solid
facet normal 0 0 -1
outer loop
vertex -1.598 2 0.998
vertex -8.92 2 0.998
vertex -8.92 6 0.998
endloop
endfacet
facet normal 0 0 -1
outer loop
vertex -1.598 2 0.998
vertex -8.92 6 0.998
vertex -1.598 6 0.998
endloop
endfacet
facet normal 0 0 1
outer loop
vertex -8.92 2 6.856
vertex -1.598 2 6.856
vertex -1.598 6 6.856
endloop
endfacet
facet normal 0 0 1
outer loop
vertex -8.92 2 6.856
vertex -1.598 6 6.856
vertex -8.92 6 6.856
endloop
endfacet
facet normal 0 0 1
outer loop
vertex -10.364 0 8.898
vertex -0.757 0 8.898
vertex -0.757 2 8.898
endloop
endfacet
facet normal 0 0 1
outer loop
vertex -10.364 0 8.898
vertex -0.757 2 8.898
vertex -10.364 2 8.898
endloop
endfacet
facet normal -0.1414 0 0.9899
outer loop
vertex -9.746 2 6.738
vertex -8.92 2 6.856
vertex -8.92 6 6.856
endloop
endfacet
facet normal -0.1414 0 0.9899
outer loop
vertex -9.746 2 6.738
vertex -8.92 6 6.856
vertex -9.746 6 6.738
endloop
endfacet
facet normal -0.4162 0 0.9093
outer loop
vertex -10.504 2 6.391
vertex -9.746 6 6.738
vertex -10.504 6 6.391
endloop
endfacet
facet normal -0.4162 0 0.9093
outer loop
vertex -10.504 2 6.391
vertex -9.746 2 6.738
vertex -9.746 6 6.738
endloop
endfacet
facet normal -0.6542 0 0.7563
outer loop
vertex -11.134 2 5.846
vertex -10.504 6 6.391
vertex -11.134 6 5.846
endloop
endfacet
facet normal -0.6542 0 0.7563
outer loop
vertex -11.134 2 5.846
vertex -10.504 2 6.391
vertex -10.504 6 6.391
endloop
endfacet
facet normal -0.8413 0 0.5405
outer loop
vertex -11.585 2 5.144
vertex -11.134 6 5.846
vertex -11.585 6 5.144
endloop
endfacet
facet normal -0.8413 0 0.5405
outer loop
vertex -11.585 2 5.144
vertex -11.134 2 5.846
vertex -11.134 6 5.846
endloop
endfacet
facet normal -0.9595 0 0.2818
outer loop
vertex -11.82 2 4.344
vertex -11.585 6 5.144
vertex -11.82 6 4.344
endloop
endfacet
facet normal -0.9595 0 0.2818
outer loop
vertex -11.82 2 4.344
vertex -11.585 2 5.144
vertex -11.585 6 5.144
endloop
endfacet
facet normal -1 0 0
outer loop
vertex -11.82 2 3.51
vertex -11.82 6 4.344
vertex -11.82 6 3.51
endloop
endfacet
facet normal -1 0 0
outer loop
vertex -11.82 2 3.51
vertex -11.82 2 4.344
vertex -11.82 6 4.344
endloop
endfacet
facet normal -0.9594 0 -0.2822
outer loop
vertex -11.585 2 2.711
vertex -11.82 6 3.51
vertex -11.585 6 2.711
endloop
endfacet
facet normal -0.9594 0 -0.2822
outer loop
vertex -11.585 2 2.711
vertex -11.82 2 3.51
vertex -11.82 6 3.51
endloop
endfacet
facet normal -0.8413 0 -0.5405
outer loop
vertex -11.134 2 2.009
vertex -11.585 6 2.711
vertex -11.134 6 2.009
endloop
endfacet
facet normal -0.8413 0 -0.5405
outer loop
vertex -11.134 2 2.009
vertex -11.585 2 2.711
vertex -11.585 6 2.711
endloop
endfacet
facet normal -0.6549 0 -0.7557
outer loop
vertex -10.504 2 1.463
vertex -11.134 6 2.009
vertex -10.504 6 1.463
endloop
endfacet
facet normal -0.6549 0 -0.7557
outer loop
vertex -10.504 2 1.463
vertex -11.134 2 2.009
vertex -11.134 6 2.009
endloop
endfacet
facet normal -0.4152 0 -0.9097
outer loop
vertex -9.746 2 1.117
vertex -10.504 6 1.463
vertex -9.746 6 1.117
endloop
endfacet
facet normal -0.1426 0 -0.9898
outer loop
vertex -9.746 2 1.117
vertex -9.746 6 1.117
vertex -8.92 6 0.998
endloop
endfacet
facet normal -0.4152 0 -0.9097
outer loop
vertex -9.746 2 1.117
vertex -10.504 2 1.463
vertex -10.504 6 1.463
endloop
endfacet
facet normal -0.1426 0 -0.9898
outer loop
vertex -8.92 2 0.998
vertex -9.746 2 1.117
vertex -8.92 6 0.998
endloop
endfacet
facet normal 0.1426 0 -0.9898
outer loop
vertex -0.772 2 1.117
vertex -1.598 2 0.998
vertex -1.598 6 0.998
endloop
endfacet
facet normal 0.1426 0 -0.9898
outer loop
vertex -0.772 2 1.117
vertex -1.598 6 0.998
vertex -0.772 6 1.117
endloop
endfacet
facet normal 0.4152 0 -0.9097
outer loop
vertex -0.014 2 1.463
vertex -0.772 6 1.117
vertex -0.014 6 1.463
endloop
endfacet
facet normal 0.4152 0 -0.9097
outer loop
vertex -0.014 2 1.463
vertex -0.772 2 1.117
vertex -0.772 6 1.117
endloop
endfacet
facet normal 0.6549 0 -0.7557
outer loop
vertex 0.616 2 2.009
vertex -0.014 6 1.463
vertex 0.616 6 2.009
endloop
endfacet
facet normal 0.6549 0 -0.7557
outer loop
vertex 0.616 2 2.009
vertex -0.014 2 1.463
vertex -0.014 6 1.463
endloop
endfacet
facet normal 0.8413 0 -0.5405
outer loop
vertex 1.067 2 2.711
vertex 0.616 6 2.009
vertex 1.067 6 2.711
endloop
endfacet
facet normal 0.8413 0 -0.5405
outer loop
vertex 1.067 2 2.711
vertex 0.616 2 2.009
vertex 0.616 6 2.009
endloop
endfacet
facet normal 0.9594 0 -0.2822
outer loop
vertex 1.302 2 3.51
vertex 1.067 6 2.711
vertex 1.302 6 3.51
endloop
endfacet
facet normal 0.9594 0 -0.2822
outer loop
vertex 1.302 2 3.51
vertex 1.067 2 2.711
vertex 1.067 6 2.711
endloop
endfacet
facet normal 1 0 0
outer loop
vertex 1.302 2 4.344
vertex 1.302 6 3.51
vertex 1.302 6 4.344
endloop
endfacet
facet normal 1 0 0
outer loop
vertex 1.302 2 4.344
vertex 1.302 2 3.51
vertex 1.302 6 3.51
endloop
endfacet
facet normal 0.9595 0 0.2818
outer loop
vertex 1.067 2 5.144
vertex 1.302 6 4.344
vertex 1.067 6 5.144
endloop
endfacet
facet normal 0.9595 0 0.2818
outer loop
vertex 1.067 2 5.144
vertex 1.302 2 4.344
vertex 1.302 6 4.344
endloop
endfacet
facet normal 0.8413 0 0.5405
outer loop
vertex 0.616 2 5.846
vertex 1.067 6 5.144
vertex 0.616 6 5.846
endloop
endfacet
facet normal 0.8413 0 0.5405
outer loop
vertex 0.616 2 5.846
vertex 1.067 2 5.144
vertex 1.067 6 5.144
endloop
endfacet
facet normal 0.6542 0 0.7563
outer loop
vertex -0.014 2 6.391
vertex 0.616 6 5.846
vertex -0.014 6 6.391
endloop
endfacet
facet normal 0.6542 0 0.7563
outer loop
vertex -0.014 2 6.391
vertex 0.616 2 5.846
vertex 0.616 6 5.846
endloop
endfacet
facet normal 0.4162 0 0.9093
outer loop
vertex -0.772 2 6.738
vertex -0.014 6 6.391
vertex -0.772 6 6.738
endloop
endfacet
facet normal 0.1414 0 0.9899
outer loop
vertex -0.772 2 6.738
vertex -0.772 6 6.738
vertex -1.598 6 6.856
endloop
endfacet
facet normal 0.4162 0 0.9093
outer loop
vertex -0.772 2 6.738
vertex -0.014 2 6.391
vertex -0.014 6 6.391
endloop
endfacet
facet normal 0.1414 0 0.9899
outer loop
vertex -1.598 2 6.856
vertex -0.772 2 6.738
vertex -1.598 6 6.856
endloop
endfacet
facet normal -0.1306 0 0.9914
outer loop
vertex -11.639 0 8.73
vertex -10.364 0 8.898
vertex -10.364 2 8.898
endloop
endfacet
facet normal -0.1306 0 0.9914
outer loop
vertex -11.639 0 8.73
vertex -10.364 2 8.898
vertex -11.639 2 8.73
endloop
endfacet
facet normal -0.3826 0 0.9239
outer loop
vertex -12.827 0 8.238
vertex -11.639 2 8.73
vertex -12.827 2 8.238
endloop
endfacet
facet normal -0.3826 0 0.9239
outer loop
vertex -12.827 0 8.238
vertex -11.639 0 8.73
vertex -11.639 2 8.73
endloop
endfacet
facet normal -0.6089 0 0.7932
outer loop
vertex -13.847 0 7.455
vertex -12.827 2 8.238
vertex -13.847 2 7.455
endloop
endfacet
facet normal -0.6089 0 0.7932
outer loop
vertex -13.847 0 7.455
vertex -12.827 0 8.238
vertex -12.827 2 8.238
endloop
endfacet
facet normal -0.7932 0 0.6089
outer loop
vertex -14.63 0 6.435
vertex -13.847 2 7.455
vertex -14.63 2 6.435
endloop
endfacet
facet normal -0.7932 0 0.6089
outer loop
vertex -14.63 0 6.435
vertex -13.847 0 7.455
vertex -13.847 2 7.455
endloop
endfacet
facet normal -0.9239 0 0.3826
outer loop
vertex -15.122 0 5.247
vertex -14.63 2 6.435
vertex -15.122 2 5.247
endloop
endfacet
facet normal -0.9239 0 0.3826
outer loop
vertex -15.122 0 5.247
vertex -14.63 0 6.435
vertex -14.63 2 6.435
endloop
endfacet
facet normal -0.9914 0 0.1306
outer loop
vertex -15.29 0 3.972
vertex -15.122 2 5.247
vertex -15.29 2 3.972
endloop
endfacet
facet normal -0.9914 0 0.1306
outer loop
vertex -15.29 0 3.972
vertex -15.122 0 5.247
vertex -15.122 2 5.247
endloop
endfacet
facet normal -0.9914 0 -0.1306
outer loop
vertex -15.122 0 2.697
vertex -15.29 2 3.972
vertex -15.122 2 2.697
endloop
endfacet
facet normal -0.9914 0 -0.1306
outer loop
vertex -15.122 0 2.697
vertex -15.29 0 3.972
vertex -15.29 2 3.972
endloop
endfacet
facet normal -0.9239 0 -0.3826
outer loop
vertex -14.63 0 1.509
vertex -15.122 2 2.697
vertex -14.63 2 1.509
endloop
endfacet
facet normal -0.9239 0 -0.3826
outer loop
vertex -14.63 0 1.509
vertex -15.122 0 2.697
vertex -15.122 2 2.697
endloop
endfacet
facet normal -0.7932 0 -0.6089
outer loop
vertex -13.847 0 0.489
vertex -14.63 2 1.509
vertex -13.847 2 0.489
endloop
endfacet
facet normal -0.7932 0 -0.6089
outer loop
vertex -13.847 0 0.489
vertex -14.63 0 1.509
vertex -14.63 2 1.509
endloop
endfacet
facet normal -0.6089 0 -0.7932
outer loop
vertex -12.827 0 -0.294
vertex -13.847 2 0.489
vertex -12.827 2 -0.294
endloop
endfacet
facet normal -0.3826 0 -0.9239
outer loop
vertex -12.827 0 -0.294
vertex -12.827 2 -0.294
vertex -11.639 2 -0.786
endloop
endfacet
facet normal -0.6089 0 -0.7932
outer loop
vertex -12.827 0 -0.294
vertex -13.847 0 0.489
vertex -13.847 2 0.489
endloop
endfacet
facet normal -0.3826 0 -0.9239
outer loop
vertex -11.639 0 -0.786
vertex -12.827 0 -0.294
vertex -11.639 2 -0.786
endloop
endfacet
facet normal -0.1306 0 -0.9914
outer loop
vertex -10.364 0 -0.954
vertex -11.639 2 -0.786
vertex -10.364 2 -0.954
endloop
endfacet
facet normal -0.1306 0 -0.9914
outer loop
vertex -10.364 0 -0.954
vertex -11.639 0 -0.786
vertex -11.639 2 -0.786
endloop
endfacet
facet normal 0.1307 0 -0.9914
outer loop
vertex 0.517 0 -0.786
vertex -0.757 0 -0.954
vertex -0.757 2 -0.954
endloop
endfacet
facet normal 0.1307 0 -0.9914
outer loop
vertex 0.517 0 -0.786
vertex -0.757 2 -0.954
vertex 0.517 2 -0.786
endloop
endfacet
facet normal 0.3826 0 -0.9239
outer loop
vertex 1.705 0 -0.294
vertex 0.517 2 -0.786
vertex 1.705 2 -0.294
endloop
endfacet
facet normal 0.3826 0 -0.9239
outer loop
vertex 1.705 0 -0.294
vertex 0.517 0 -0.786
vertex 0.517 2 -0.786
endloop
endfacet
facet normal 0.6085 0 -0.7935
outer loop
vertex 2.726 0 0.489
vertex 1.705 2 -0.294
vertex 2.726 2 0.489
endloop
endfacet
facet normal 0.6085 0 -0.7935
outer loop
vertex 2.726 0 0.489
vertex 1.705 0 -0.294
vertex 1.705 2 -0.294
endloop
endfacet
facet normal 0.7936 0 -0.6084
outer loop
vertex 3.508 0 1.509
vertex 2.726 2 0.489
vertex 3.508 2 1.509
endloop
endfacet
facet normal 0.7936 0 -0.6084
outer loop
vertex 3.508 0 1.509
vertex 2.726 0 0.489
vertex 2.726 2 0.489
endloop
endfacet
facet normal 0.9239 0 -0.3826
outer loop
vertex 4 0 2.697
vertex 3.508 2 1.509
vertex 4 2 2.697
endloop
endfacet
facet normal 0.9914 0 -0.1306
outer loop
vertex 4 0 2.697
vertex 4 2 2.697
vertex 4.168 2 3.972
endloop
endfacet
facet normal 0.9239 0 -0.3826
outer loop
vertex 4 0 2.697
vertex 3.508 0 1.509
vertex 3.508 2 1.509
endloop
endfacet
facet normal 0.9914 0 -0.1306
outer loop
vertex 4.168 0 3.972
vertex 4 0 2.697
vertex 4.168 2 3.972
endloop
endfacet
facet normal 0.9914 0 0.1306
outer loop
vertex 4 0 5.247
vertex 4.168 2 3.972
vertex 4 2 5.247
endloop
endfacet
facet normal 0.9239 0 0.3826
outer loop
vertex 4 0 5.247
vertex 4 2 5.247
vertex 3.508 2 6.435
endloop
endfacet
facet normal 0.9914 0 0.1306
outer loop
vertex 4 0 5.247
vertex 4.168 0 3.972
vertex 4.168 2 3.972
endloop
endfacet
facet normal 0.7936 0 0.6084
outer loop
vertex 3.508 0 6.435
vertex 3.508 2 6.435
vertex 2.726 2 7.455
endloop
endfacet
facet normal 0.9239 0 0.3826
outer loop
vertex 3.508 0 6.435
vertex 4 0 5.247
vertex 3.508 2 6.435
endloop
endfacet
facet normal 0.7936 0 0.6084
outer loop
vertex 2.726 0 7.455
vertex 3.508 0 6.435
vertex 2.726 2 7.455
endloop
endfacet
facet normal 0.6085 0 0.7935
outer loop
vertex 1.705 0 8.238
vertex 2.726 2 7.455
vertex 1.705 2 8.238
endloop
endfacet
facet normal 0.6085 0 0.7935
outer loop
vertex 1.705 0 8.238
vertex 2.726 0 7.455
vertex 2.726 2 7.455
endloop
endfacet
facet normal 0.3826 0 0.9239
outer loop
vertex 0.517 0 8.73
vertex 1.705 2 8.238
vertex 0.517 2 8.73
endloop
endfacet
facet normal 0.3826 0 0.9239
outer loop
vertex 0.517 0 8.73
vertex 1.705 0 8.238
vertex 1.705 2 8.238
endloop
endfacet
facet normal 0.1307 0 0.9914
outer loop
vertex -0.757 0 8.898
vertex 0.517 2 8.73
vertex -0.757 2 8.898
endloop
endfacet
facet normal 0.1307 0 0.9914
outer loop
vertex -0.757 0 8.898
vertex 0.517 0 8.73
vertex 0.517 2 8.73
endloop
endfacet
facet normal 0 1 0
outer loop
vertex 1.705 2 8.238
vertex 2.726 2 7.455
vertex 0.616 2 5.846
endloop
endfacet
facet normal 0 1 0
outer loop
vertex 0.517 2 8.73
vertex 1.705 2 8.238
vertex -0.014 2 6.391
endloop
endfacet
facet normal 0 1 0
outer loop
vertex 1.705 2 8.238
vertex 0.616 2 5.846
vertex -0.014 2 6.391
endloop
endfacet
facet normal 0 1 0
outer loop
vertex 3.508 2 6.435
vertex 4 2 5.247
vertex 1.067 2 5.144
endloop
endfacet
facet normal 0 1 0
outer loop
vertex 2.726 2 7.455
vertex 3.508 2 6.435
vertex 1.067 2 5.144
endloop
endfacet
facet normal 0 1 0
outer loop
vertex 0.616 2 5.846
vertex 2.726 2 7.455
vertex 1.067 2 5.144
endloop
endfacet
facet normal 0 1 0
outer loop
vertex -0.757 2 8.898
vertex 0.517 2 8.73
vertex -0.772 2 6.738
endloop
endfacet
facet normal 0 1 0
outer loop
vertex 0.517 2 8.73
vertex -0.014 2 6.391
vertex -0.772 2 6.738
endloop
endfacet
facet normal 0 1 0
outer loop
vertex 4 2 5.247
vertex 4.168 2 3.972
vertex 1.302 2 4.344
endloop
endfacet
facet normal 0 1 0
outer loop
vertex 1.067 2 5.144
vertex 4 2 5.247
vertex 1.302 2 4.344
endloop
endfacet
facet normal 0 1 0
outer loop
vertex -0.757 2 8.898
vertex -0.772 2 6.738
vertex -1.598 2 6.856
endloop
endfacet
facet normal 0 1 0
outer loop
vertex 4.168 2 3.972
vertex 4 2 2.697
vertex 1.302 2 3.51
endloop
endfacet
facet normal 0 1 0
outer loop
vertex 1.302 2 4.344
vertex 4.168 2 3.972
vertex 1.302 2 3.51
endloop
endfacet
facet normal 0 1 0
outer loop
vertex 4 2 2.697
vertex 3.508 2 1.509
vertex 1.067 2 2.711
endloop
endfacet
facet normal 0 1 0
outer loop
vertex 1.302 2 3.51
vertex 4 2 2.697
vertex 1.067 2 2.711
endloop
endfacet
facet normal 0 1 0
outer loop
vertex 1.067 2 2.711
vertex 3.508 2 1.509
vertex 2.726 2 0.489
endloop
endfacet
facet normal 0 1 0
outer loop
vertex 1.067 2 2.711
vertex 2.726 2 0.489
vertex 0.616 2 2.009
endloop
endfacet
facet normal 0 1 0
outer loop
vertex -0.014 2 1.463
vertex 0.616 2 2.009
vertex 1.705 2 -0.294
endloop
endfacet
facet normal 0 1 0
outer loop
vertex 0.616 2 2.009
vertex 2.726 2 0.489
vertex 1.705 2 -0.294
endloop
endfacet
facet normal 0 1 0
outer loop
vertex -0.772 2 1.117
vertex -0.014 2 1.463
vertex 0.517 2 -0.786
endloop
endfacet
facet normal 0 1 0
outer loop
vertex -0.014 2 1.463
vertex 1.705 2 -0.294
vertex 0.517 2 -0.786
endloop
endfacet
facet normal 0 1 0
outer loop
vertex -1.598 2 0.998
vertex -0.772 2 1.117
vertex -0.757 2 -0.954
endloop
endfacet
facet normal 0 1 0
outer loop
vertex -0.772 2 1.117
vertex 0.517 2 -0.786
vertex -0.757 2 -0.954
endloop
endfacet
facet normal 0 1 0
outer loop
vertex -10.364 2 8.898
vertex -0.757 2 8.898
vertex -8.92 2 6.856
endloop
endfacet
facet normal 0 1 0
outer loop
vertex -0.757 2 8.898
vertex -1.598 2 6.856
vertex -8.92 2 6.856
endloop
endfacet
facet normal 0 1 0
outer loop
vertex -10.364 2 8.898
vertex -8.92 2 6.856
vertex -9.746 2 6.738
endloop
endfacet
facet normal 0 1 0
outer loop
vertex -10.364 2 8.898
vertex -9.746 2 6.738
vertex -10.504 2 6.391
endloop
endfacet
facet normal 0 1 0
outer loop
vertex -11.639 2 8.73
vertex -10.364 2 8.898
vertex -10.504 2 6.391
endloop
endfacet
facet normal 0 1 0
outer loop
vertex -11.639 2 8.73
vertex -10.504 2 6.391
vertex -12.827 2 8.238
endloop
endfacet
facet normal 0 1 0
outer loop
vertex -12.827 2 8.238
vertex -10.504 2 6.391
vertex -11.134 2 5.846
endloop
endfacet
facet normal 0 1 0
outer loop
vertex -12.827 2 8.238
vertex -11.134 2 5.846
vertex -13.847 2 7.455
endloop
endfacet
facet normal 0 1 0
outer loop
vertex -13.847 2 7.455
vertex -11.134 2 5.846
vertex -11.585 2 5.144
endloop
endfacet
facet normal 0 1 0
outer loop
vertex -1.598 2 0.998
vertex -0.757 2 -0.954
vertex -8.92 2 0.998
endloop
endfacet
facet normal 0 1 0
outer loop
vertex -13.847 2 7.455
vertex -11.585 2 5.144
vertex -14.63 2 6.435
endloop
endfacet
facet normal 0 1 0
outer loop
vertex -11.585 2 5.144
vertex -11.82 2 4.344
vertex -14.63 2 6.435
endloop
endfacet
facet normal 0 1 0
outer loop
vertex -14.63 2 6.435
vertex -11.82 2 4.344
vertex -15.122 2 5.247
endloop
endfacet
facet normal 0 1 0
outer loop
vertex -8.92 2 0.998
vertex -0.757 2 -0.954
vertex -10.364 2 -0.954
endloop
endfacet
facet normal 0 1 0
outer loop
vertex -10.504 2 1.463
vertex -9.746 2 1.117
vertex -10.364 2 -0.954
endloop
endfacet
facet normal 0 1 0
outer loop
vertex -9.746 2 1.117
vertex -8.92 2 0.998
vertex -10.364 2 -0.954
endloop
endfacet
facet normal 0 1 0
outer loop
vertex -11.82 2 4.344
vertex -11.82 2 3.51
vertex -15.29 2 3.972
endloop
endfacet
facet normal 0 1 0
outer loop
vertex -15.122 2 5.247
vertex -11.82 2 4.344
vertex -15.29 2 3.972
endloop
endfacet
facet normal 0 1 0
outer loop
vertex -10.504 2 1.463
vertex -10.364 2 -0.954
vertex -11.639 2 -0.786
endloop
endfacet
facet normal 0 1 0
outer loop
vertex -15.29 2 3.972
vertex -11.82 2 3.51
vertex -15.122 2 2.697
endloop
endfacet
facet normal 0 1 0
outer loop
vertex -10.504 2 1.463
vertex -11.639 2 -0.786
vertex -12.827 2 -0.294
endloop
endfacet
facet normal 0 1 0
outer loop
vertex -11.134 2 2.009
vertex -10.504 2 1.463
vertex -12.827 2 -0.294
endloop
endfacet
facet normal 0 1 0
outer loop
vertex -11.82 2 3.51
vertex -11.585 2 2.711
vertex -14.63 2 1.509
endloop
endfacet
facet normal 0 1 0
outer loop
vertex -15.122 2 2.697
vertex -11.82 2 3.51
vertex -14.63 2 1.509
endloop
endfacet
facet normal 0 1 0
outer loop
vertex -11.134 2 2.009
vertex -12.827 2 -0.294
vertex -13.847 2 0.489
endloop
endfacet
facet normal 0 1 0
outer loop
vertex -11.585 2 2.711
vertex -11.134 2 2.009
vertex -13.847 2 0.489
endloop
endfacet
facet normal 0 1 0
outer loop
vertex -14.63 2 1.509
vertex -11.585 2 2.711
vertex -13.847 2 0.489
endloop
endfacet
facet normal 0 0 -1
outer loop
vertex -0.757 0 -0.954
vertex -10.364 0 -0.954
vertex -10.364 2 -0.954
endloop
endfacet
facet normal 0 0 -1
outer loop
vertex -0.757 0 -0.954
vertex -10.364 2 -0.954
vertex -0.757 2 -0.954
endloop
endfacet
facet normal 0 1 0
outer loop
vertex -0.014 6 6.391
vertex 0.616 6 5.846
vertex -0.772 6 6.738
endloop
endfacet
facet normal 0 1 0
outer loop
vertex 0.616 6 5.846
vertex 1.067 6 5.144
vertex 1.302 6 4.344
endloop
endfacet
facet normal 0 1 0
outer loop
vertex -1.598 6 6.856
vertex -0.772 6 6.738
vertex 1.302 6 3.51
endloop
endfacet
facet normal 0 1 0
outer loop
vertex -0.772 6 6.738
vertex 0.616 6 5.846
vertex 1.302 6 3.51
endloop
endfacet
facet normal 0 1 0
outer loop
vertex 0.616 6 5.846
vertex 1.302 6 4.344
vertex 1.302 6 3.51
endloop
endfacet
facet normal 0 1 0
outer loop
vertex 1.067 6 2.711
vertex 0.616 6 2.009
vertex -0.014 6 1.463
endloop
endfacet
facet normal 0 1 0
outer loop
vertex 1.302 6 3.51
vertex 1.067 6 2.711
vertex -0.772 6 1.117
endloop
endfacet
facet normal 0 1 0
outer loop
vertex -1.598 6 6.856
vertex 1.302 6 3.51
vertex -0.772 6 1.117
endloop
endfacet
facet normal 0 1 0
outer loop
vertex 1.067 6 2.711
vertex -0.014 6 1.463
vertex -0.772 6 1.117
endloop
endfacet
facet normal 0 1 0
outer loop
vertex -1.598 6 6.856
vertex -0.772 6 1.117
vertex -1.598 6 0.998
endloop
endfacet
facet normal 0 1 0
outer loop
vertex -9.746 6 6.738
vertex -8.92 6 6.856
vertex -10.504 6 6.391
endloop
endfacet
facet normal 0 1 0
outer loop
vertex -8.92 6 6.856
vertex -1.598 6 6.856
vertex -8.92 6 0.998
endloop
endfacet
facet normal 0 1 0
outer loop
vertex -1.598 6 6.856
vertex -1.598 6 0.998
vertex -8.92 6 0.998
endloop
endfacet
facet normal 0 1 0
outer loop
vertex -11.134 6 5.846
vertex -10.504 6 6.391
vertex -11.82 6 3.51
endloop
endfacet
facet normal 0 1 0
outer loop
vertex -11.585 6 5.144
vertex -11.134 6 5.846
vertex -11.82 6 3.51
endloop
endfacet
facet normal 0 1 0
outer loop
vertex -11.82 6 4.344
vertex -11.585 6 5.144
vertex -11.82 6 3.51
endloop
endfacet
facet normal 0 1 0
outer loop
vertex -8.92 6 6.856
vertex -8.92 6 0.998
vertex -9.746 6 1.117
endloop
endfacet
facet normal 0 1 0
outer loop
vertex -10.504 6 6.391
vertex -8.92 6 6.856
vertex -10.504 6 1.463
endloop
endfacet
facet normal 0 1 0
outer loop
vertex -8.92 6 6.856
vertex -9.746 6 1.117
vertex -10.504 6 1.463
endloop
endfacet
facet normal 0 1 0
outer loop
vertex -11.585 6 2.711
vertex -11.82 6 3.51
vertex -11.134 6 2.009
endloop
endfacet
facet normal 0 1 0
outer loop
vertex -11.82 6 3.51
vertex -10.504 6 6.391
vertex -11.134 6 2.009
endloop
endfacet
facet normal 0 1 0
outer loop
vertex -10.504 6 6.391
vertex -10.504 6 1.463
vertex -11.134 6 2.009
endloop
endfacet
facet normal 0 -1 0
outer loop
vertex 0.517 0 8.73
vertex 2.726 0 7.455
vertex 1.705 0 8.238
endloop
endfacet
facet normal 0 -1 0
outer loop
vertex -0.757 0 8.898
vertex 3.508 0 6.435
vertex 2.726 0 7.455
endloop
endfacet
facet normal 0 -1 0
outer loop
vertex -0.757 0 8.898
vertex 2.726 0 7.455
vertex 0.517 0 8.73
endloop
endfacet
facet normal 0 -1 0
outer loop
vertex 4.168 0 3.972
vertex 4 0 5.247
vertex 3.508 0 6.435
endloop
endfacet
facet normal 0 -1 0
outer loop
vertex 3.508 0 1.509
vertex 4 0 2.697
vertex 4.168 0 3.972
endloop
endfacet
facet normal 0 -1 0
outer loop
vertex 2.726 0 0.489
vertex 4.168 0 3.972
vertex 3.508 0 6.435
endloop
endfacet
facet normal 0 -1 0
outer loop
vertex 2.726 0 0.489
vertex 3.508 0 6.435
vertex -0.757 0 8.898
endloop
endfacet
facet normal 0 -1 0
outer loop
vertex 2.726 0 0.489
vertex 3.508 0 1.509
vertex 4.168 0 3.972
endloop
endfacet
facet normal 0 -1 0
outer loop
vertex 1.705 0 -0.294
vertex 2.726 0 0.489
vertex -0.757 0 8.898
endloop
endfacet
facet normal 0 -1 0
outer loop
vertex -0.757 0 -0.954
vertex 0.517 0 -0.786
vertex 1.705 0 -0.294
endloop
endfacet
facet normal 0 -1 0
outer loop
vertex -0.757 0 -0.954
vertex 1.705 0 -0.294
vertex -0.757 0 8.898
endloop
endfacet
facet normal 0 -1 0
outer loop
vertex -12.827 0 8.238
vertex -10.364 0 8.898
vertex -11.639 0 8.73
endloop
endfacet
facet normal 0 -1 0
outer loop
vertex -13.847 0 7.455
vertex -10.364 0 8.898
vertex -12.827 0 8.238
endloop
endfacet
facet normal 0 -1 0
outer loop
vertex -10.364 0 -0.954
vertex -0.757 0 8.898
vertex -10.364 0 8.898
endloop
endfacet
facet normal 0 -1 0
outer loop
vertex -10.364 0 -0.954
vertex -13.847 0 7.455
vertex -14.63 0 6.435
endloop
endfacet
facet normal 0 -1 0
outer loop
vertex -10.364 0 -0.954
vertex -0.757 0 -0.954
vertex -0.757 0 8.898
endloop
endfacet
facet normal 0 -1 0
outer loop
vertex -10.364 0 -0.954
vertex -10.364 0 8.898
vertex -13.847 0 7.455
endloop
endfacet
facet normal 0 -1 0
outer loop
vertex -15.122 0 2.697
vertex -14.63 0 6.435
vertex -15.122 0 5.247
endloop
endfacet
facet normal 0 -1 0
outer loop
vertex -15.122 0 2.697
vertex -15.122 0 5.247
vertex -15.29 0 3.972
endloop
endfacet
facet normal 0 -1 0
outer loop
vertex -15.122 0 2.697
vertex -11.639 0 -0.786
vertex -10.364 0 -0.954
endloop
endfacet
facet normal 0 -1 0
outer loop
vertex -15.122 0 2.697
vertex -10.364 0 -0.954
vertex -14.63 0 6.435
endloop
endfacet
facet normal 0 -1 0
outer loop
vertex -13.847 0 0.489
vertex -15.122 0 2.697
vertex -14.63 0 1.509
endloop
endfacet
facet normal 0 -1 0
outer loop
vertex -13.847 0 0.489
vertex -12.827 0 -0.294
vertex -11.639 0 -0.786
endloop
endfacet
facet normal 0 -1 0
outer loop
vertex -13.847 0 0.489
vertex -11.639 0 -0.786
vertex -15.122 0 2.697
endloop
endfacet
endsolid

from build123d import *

# Parameters (mm, degrees)
EXTRUDE_1_DEPTH = 2
EXTRUDE_2_DEPTH = 4


with BuildPart() as part:
    # 草图1 → 凸台-拉伸1 (new body)
    with BuildSketch(Plane(origin=(0, 0, 0), x_dir=(1, 0, 0), z_dir=(0, 1, 0))):
        with BuildLine():
            Line((-10.36417176, 0.953563282), (-0.75738839, 0.953563282))
            ThreePointArc((-0.75738839, 0.953563282), (4.168182633, -3.972007741), (-0.75738839, -8.897578764))
            Line((-0.75738839, -8.897578764), (-10.36417176, -8.897578764))
            ThreePointArc((-10.36417176, -8.897578764), (-15.289742784, -3.972007741), (-10.36417176, 0.953563282))
        make_face()
    extrude(amount=EXTRUDE_1_DEPTH)

    # 草图2 → 凸台-拉伸2 (add)
    with BuildSketch(Plane(origin=(0, 2, 0), x_dir=(1, 0, 0), z_dir=(0, 1, 0))):
        with BuildLine():
            Line((-8.92046187, -0.998228401), (-1.597644475, -0.998228401))
            ThreePointArc((-1.597644475, -0.998228401), (1.331482483, -3.927355359), (-1.597644475, -6.856482317))
            Line((-1.597644475, -6.856482317), (-8.92046187, -6.856482317))
            ThreePointArc((-8.92046187, -6.856482317), (-11.849588828, -3.927355359), (-8.92046187, -0.998228401))
        make_face()
    extrude(amount=EXTRUDE_2_DEPTH)


solid = part.part
